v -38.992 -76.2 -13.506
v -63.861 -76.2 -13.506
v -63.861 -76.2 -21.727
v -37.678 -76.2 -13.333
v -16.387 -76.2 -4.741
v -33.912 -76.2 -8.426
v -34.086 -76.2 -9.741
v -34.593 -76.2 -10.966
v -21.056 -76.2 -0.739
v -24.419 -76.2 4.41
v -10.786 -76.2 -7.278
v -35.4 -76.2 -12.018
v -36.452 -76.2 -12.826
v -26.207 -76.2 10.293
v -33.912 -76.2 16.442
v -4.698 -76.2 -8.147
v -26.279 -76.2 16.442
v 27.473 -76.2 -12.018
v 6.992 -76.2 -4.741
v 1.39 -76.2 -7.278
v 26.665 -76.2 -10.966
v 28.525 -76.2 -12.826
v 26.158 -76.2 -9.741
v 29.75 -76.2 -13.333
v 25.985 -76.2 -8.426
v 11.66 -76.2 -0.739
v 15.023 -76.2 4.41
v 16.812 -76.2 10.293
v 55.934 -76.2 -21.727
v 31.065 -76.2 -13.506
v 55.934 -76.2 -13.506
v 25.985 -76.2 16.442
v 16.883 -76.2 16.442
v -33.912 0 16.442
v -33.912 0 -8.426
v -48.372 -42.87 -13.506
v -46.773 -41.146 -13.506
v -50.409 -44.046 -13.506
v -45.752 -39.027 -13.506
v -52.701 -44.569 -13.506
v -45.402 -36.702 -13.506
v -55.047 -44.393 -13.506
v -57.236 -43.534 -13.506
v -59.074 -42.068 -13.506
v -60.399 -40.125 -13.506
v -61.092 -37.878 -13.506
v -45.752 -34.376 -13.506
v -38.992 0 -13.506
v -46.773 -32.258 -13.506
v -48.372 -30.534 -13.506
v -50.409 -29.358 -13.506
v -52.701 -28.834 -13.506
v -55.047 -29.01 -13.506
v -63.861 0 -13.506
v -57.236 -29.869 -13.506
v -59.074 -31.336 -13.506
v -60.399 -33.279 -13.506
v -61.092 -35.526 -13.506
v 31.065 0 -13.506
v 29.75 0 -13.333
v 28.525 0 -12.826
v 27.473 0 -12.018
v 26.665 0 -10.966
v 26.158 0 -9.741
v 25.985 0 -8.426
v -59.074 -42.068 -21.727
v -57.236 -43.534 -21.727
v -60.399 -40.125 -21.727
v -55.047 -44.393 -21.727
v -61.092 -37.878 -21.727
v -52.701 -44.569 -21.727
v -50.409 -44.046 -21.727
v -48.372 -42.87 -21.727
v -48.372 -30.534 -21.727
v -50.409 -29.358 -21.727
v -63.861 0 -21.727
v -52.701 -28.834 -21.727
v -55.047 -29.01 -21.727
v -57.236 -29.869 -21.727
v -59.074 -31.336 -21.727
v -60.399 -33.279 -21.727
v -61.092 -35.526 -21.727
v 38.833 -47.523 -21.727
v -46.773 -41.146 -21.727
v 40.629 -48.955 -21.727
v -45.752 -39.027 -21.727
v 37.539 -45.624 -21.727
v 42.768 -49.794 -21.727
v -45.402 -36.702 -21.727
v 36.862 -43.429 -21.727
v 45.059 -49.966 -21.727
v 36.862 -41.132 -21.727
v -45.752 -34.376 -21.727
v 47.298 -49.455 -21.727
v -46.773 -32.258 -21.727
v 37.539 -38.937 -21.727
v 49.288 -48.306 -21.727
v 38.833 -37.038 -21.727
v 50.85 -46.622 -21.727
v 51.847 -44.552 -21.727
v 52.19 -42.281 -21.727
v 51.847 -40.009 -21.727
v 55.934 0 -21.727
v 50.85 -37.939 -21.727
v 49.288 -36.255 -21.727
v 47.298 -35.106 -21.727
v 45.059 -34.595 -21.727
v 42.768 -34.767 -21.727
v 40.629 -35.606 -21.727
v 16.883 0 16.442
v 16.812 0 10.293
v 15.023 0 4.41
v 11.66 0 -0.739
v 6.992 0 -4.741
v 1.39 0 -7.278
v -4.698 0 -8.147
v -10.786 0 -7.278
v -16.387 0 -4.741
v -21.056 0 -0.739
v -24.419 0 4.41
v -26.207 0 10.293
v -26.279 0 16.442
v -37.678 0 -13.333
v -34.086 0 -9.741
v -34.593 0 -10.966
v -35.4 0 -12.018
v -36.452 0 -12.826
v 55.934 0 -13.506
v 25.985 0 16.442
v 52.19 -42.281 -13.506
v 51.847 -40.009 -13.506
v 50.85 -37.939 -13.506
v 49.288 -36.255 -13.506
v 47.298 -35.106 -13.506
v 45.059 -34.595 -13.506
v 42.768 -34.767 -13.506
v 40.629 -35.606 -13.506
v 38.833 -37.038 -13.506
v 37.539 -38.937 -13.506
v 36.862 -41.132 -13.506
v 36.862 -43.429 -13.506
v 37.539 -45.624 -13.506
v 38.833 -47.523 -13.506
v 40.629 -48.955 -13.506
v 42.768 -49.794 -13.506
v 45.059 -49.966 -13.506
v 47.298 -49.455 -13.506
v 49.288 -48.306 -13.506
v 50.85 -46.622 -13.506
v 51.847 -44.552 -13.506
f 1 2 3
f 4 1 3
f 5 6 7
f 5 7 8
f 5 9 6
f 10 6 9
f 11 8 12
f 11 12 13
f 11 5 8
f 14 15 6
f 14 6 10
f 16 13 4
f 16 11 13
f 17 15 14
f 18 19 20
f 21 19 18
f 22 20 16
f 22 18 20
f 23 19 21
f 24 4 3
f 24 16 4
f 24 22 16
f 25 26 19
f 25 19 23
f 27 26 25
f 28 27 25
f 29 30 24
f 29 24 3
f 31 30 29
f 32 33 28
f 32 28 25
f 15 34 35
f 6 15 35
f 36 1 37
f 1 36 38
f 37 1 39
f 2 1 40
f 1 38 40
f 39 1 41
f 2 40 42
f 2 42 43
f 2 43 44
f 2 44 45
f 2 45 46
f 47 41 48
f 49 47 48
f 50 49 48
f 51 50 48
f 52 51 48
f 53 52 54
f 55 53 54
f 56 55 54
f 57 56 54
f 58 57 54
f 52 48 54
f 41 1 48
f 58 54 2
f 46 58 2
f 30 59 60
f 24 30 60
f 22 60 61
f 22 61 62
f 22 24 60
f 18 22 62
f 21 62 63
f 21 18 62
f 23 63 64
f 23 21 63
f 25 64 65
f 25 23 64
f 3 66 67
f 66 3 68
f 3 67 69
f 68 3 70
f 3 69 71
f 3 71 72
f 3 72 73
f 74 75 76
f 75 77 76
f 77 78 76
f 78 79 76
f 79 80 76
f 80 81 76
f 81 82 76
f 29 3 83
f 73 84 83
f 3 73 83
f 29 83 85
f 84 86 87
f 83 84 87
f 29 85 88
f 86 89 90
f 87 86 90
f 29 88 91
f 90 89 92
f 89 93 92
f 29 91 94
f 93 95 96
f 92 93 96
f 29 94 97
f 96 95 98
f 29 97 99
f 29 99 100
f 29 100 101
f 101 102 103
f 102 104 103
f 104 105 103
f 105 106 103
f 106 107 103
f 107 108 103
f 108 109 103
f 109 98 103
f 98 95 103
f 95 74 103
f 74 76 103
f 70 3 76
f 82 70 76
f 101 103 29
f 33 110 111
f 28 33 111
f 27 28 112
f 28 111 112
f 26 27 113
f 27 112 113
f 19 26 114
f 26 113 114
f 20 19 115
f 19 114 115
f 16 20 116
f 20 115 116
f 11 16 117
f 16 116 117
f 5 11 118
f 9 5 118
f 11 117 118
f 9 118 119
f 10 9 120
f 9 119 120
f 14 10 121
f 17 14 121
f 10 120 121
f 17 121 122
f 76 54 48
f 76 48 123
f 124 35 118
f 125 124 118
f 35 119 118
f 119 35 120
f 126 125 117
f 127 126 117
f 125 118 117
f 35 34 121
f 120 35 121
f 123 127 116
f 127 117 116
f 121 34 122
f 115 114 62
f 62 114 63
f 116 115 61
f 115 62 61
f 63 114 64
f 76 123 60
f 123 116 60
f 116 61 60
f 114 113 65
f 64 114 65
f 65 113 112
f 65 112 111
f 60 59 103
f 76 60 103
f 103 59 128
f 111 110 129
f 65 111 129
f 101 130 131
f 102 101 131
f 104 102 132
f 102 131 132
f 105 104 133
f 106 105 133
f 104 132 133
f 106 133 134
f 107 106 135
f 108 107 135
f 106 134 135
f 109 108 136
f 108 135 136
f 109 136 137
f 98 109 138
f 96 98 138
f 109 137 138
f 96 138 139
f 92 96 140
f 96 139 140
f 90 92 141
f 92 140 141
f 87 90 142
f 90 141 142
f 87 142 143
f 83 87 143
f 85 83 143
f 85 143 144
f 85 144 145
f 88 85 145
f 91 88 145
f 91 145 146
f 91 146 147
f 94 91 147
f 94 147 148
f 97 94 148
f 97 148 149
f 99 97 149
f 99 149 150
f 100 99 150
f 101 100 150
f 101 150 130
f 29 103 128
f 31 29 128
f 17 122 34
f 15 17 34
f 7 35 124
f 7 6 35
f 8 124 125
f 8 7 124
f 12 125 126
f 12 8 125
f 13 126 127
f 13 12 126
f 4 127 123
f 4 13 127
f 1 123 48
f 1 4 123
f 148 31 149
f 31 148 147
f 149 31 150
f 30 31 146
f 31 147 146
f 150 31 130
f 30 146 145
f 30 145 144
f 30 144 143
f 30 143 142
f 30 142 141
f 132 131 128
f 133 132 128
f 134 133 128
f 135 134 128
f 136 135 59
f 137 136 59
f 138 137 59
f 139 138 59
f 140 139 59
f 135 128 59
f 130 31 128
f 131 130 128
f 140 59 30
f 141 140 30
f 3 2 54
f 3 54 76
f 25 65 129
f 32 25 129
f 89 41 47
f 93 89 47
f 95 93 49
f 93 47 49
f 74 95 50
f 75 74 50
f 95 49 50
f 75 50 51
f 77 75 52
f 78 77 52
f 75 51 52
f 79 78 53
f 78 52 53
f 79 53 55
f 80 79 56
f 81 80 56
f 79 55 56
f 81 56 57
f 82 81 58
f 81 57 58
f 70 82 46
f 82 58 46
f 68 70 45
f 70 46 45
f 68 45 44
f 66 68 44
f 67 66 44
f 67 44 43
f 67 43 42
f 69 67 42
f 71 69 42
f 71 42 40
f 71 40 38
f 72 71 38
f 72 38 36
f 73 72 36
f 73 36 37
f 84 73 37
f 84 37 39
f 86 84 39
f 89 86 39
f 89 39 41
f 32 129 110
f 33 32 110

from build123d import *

# Parameters (mm, degrees)
F1_DEPTH = 76.2
F2_R     = 5.08
F3_R     = 7.707036
F3_R_2   = 7.889442
F4_DEPTH = 25.4


with BuildPart() as f1:
    # F0 (on Front) → F1 (new body)
    with BuildSketch(Plane.XZ):
        with BuildLine():
            Line((-63.861191, -13.506276), (-63.861191, -21.727486))
            Line((-63.861191, -21.727486), (55.933593, -21.727486))
            Line((55.933593, -21.727486), (55.933593, -13.506276))
            Line((55.933593, -13.506276), (25.984896, -13.506276))
            Line((25.984896, -13.506276), (25.984896, 16.442422))
            Line((25.984896, 16.442422), (16.882844, 16.442422))
            ThreePointArc((16.882844, 16.442422), (-4.697835, -8.147052), (-26.278514, 16.442422))
            Line((-26.278514, 16.442422), (-33.912495, 16.442422))
            Line((-33.912495, 16.442422), (-33.912495, -13.506276))
            Line((-33.912495, -13.506276), (-63.861191, -13.506276))
        make_face()
    extrude(amount=F1_DEPTH)

    # F2
    f2_edges = [f1.edges().sort_by_distance(p)[0] for p in [
        (-33.912495, -38.1, -13.506276),
        (25.984896, -38.1, -13.506276),
    ]]
    fillet(f2_edges, radius=F2_R)

    # F3 (on face) → F4 (cut)
    with BuildSketch(Plane.XY.offset(-13.506276)):
        with Locations((44.482626, -42.280514)):
            Circle(F3_R)
        with Locations((-53.291064, -36.701836)):
            Circle(F3_R_2)
    extrude(amount=-F4_DEPTH, mode=Mode.SUBTRACT)


solid = f1.part
